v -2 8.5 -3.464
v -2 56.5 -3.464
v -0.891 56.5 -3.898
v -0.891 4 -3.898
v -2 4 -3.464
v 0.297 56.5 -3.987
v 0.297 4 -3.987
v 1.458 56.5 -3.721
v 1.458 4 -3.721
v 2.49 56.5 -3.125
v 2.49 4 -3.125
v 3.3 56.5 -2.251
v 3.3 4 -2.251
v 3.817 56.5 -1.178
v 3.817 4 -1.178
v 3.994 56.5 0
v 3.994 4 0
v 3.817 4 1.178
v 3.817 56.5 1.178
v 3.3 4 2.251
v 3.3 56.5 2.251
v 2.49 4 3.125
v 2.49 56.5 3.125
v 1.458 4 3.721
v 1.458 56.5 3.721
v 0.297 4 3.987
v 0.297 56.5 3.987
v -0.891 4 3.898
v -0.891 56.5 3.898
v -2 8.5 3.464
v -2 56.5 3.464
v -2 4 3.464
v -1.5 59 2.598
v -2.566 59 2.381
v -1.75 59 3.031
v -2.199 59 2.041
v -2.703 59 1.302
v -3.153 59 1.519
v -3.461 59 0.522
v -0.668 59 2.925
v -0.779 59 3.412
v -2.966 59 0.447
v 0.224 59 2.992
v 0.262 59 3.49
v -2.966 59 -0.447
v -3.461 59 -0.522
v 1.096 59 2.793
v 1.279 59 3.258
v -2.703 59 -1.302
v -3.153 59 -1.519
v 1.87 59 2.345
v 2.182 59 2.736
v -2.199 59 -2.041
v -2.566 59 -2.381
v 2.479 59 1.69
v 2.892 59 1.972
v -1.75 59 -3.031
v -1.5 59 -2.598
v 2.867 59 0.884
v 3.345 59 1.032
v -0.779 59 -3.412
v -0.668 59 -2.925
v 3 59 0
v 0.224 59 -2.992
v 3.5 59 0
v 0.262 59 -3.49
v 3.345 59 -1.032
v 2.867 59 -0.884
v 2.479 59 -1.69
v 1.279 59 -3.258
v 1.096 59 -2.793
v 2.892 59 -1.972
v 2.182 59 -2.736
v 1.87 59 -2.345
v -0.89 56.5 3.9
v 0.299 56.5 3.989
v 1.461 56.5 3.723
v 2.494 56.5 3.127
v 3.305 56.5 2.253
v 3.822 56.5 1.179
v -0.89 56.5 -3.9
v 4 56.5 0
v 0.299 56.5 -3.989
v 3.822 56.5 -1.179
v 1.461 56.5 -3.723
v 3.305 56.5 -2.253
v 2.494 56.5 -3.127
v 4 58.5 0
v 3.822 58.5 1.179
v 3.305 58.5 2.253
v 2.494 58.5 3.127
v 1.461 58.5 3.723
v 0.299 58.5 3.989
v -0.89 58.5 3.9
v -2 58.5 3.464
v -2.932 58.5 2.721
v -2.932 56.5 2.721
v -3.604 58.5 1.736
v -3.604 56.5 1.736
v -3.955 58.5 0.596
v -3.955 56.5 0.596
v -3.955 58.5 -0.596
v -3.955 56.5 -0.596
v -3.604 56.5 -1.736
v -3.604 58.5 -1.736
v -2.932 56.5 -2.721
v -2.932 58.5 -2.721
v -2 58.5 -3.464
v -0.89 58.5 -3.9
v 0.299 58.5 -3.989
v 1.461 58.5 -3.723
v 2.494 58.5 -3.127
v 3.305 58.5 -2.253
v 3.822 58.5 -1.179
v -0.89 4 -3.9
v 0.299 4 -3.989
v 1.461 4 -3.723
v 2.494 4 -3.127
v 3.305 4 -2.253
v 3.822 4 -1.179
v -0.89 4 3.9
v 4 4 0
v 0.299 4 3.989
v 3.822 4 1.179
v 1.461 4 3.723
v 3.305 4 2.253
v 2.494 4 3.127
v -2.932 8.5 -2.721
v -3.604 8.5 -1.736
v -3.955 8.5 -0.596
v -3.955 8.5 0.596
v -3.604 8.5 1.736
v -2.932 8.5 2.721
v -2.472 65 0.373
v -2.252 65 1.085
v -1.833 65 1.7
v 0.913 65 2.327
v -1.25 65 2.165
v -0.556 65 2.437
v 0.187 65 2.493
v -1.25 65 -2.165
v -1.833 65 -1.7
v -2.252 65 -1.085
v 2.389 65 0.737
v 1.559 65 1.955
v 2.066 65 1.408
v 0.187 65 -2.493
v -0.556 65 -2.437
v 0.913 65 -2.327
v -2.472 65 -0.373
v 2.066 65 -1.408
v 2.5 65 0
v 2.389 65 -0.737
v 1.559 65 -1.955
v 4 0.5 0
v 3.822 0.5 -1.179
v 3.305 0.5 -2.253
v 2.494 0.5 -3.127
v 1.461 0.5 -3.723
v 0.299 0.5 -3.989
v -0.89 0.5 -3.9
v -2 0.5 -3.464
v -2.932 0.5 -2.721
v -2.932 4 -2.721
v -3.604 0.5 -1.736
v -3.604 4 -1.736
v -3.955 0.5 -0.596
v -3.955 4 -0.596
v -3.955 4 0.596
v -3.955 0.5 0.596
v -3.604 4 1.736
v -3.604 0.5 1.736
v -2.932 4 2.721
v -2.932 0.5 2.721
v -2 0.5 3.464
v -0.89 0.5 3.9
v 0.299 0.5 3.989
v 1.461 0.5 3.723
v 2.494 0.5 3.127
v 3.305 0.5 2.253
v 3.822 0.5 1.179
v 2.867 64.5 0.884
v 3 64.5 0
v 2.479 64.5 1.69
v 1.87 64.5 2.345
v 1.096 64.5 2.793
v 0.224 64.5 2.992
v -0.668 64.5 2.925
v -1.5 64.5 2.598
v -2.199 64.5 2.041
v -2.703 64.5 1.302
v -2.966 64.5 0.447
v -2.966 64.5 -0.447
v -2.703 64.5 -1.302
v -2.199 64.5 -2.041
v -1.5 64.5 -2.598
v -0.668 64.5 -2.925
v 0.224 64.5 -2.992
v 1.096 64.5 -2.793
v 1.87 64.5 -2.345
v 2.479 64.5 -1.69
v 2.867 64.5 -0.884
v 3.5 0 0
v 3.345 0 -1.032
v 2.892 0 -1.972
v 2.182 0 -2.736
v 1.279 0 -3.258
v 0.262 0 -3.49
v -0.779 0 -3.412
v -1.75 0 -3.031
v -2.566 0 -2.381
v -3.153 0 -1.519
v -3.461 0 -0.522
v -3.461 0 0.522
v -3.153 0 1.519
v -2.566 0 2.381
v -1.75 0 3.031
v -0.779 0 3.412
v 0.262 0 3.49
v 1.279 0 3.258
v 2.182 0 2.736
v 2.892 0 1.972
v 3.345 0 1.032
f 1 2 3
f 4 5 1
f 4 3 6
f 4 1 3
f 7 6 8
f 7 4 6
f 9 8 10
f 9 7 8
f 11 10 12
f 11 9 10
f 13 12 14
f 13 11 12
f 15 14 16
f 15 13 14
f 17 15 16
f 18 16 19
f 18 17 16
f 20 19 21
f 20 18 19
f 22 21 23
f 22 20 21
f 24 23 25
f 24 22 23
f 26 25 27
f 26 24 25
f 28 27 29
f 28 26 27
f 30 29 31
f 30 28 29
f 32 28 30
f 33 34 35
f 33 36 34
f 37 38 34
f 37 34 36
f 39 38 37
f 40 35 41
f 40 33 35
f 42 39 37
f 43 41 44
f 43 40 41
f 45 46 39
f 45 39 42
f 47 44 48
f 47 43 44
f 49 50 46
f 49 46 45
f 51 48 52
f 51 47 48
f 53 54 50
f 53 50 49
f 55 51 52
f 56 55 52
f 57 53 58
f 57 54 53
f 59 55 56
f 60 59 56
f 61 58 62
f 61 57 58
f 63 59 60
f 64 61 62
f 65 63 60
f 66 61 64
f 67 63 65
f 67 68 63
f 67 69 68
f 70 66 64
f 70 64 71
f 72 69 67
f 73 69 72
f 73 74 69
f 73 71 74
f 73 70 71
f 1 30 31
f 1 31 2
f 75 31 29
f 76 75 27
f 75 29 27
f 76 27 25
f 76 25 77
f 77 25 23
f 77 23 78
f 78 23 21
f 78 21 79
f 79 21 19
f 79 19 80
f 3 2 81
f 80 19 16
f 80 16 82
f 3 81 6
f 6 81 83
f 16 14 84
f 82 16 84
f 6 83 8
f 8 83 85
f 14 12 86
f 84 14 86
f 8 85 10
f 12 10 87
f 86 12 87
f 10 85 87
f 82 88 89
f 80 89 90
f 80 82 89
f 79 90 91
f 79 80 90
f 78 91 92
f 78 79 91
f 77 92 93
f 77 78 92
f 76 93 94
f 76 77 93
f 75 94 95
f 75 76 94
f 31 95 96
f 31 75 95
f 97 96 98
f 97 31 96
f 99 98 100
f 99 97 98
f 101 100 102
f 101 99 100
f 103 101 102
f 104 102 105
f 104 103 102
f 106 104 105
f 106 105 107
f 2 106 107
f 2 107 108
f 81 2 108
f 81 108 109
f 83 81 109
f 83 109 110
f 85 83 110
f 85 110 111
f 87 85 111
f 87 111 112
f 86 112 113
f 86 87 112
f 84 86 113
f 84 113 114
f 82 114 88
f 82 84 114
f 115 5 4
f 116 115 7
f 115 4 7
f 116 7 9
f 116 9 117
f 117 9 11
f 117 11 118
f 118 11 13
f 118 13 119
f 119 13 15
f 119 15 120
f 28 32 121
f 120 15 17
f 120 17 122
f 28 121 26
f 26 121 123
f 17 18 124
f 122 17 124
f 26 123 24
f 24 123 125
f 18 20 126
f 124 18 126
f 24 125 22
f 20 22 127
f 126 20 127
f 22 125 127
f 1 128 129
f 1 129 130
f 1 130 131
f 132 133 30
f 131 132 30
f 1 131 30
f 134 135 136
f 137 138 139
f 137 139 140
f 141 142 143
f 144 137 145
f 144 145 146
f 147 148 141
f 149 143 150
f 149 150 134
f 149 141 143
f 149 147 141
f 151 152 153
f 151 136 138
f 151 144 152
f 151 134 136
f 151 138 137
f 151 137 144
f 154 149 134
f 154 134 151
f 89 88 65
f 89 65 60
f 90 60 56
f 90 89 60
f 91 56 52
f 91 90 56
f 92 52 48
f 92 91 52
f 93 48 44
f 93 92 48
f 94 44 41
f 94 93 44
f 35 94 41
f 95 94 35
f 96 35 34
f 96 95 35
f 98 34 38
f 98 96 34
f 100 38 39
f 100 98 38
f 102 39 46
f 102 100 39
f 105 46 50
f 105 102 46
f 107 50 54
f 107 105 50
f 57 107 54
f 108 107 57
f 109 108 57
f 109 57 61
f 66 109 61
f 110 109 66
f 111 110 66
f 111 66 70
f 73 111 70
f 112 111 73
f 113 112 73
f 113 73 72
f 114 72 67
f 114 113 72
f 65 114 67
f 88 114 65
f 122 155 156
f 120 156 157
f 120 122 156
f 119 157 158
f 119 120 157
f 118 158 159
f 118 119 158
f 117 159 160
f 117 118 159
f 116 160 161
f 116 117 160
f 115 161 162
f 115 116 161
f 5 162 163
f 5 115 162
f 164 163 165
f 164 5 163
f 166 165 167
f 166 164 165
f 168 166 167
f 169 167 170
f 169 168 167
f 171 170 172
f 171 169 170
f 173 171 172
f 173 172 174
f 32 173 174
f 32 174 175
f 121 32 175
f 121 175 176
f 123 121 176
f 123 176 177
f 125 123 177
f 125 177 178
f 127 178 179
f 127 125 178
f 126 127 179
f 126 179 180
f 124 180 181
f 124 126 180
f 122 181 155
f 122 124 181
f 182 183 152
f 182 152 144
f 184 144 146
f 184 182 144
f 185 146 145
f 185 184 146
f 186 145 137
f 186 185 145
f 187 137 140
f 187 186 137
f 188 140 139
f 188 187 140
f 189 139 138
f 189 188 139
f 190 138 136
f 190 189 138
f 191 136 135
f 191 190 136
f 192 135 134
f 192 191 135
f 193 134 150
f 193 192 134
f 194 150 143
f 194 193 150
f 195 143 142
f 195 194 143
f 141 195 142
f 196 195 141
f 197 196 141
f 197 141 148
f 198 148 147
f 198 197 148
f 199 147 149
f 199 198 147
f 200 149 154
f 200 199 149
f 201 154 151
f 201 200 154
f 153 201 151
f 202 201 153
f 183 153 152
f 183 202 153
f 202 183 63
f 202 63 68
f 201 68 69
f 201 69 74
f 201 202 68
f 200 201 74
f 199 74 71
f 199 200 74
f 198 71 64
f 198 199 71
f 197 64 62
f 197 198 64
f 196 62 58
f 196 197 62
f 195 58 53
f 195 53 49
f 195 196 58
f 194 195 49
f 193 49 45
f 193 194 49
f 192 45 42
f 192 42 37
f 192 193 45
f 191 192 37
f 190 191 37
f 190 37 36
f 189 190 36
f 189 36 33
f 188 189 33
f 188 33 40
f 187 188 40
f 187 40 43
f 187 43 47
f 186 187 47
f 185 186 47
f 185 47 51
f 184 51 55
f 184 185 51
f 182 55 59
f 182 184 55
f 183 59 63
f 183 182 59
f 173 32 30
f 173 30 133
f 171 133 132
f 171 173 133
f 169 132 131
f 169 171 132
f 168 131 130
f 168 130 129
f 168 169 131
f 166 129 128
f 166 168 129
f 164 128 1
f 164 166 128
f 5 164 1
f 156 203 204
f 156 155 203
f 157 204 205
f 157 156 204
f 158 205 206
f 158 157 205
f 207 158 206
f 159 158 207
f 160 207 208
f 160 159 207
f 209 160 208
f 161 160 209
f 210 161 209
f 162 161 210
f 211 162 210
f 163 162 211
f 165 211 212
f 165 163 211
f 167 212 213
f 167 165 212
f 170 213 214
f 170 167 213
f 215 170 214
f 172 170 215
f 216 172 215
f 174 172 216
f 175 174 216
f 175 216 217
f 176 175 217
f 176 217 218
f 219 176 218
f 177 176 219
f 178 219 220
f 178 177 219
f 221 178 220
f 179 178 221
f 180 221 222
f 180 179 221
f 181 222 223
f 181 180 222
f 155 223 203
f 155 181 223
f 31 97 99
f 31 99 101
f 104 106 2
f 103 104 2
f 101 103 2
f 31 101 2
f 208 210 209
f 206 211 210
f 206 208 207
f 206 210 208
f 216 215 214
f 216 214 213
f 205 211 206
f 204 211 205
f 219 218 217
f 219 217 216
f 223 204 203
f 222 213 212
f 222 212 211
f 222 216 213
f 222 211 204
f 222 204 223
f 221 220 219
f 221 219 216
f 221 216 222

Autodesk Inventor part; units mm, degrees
ref_plane "YZ Plane" through (0, 0, 0) normal (1, 0, 0) x (0, 1, 0)
ref_plane "XZ Plane" through (0, 0, 0) normal (0, 1, 0) x (-1, 0, 0)
ref_plane "XY Plane" through (0, 0, 0) normal (0, 0, 1) x (1, 0, 0)
sketch "Sketch1" plane through (0, 0, 0) normal (0, 1, 0) x (-1, 0, 0)
  line L0 (-4, 0) -> (2, 0)
  line L1 (2, 3.4641) -> (2, -3.4641)
  arc A0 (2, 3.4641) -> (2, -3.4641) centre (0.004, 0) ccw
  point P0 (0, 0)
  dimension "d1" = 6
extrude "Extrusion1" add sketch "Sketch1" along normal blind 65
sketch "Sketch2" plane through (0, 65, 0) normal (0, 1, 0) x (1, 0, 0)
  line L0 (-2, -3.4641) -> (-2, 3.4641)
  line L1 (-2, 3.4641) -> (-2, -3.4641) projected
  arc A0 (-2, 3.4641) -> (-2, -3.4641) centre (0, 0) ccw
extrude "Extrusion2" add sketch "Sketch2" against normal blind 8.5
sketch "Sketch3" plane through (0, 0, 0) normal (0, -1, 0) x (1, 0, 0)
  line L0 (-2, -3.4641) -> (-2, 3.4641)
  arc A0 (-2, 3.4641) -> (-2, -3.4641) centre (0, 0) ccw
  point P0 (0, 0)
extrude "Extrusion3" add sketch "Sketch3" against normal blind 8.5
sketch "Sketch4" plane through (0, 65, 0) normal (0, 1, 0) x (1, 0, 0)
  circle A0 centre (0, 0) radius 4
  dimension "d9" = 8
extrude "Extrusion4" cut sketch "Sketch4" against normal blind 8.5
sketch "Sketch5" plane through (0, 56.5, 0) normal (0, 1, 0) x (1, 0, 0)
  circle A0 centre (0, 0) radius 4
  dimension "d12" = 8
extrude "Extrusion5" add sketch "Sketch5" along normal blind 8.5
sketch "Sketch6" plane through (0, 65, 0) normal (0, 1, 0) x (1, 0, 0)
  circle A0 centre (0, 0) radius 3
  circle A1 centre (0, 0) radius 4
  dimension "d15" = 6
  dimension "d16" = 8
extrude "Extrusion6" cut sketch "Sketch6" against normal blind 6
thread "Thread1" size "M6x1" class "6g" standard "ANSI Metric M Profile" full length
chamfer "Chamfer1" distance 0.5 angle 45 1 edges at (-3, 65, 0)
chamfer "Chamfer2" distance 0.5 angle 45 1 edges at (-4, 59, 0)
sketch "Sketch7" plane through (0, 0, 0) normal (0, -1, 0) x (1, 0, 0)
  circle A0 centre (0, 0) radius 4
  dimension "d27" = 8
extrude "Extrusion7" cut sketch "Sketch7" against normal blind 4
sketch "Sketch8" plane through (0, 4, 0) normal (0, -1, 0) x (1, 0, 0)
  circle A0 centre (0, 0) radius 4
  dimension "d30" = 8
extrude "Extrusion8" add sketch "Sketch8" along normal blind 4
chamfer "Chamfer3" distance 0.5 angle 45 1 edges at (-4, 0, 0)
properties part number "hridel_senzor"
